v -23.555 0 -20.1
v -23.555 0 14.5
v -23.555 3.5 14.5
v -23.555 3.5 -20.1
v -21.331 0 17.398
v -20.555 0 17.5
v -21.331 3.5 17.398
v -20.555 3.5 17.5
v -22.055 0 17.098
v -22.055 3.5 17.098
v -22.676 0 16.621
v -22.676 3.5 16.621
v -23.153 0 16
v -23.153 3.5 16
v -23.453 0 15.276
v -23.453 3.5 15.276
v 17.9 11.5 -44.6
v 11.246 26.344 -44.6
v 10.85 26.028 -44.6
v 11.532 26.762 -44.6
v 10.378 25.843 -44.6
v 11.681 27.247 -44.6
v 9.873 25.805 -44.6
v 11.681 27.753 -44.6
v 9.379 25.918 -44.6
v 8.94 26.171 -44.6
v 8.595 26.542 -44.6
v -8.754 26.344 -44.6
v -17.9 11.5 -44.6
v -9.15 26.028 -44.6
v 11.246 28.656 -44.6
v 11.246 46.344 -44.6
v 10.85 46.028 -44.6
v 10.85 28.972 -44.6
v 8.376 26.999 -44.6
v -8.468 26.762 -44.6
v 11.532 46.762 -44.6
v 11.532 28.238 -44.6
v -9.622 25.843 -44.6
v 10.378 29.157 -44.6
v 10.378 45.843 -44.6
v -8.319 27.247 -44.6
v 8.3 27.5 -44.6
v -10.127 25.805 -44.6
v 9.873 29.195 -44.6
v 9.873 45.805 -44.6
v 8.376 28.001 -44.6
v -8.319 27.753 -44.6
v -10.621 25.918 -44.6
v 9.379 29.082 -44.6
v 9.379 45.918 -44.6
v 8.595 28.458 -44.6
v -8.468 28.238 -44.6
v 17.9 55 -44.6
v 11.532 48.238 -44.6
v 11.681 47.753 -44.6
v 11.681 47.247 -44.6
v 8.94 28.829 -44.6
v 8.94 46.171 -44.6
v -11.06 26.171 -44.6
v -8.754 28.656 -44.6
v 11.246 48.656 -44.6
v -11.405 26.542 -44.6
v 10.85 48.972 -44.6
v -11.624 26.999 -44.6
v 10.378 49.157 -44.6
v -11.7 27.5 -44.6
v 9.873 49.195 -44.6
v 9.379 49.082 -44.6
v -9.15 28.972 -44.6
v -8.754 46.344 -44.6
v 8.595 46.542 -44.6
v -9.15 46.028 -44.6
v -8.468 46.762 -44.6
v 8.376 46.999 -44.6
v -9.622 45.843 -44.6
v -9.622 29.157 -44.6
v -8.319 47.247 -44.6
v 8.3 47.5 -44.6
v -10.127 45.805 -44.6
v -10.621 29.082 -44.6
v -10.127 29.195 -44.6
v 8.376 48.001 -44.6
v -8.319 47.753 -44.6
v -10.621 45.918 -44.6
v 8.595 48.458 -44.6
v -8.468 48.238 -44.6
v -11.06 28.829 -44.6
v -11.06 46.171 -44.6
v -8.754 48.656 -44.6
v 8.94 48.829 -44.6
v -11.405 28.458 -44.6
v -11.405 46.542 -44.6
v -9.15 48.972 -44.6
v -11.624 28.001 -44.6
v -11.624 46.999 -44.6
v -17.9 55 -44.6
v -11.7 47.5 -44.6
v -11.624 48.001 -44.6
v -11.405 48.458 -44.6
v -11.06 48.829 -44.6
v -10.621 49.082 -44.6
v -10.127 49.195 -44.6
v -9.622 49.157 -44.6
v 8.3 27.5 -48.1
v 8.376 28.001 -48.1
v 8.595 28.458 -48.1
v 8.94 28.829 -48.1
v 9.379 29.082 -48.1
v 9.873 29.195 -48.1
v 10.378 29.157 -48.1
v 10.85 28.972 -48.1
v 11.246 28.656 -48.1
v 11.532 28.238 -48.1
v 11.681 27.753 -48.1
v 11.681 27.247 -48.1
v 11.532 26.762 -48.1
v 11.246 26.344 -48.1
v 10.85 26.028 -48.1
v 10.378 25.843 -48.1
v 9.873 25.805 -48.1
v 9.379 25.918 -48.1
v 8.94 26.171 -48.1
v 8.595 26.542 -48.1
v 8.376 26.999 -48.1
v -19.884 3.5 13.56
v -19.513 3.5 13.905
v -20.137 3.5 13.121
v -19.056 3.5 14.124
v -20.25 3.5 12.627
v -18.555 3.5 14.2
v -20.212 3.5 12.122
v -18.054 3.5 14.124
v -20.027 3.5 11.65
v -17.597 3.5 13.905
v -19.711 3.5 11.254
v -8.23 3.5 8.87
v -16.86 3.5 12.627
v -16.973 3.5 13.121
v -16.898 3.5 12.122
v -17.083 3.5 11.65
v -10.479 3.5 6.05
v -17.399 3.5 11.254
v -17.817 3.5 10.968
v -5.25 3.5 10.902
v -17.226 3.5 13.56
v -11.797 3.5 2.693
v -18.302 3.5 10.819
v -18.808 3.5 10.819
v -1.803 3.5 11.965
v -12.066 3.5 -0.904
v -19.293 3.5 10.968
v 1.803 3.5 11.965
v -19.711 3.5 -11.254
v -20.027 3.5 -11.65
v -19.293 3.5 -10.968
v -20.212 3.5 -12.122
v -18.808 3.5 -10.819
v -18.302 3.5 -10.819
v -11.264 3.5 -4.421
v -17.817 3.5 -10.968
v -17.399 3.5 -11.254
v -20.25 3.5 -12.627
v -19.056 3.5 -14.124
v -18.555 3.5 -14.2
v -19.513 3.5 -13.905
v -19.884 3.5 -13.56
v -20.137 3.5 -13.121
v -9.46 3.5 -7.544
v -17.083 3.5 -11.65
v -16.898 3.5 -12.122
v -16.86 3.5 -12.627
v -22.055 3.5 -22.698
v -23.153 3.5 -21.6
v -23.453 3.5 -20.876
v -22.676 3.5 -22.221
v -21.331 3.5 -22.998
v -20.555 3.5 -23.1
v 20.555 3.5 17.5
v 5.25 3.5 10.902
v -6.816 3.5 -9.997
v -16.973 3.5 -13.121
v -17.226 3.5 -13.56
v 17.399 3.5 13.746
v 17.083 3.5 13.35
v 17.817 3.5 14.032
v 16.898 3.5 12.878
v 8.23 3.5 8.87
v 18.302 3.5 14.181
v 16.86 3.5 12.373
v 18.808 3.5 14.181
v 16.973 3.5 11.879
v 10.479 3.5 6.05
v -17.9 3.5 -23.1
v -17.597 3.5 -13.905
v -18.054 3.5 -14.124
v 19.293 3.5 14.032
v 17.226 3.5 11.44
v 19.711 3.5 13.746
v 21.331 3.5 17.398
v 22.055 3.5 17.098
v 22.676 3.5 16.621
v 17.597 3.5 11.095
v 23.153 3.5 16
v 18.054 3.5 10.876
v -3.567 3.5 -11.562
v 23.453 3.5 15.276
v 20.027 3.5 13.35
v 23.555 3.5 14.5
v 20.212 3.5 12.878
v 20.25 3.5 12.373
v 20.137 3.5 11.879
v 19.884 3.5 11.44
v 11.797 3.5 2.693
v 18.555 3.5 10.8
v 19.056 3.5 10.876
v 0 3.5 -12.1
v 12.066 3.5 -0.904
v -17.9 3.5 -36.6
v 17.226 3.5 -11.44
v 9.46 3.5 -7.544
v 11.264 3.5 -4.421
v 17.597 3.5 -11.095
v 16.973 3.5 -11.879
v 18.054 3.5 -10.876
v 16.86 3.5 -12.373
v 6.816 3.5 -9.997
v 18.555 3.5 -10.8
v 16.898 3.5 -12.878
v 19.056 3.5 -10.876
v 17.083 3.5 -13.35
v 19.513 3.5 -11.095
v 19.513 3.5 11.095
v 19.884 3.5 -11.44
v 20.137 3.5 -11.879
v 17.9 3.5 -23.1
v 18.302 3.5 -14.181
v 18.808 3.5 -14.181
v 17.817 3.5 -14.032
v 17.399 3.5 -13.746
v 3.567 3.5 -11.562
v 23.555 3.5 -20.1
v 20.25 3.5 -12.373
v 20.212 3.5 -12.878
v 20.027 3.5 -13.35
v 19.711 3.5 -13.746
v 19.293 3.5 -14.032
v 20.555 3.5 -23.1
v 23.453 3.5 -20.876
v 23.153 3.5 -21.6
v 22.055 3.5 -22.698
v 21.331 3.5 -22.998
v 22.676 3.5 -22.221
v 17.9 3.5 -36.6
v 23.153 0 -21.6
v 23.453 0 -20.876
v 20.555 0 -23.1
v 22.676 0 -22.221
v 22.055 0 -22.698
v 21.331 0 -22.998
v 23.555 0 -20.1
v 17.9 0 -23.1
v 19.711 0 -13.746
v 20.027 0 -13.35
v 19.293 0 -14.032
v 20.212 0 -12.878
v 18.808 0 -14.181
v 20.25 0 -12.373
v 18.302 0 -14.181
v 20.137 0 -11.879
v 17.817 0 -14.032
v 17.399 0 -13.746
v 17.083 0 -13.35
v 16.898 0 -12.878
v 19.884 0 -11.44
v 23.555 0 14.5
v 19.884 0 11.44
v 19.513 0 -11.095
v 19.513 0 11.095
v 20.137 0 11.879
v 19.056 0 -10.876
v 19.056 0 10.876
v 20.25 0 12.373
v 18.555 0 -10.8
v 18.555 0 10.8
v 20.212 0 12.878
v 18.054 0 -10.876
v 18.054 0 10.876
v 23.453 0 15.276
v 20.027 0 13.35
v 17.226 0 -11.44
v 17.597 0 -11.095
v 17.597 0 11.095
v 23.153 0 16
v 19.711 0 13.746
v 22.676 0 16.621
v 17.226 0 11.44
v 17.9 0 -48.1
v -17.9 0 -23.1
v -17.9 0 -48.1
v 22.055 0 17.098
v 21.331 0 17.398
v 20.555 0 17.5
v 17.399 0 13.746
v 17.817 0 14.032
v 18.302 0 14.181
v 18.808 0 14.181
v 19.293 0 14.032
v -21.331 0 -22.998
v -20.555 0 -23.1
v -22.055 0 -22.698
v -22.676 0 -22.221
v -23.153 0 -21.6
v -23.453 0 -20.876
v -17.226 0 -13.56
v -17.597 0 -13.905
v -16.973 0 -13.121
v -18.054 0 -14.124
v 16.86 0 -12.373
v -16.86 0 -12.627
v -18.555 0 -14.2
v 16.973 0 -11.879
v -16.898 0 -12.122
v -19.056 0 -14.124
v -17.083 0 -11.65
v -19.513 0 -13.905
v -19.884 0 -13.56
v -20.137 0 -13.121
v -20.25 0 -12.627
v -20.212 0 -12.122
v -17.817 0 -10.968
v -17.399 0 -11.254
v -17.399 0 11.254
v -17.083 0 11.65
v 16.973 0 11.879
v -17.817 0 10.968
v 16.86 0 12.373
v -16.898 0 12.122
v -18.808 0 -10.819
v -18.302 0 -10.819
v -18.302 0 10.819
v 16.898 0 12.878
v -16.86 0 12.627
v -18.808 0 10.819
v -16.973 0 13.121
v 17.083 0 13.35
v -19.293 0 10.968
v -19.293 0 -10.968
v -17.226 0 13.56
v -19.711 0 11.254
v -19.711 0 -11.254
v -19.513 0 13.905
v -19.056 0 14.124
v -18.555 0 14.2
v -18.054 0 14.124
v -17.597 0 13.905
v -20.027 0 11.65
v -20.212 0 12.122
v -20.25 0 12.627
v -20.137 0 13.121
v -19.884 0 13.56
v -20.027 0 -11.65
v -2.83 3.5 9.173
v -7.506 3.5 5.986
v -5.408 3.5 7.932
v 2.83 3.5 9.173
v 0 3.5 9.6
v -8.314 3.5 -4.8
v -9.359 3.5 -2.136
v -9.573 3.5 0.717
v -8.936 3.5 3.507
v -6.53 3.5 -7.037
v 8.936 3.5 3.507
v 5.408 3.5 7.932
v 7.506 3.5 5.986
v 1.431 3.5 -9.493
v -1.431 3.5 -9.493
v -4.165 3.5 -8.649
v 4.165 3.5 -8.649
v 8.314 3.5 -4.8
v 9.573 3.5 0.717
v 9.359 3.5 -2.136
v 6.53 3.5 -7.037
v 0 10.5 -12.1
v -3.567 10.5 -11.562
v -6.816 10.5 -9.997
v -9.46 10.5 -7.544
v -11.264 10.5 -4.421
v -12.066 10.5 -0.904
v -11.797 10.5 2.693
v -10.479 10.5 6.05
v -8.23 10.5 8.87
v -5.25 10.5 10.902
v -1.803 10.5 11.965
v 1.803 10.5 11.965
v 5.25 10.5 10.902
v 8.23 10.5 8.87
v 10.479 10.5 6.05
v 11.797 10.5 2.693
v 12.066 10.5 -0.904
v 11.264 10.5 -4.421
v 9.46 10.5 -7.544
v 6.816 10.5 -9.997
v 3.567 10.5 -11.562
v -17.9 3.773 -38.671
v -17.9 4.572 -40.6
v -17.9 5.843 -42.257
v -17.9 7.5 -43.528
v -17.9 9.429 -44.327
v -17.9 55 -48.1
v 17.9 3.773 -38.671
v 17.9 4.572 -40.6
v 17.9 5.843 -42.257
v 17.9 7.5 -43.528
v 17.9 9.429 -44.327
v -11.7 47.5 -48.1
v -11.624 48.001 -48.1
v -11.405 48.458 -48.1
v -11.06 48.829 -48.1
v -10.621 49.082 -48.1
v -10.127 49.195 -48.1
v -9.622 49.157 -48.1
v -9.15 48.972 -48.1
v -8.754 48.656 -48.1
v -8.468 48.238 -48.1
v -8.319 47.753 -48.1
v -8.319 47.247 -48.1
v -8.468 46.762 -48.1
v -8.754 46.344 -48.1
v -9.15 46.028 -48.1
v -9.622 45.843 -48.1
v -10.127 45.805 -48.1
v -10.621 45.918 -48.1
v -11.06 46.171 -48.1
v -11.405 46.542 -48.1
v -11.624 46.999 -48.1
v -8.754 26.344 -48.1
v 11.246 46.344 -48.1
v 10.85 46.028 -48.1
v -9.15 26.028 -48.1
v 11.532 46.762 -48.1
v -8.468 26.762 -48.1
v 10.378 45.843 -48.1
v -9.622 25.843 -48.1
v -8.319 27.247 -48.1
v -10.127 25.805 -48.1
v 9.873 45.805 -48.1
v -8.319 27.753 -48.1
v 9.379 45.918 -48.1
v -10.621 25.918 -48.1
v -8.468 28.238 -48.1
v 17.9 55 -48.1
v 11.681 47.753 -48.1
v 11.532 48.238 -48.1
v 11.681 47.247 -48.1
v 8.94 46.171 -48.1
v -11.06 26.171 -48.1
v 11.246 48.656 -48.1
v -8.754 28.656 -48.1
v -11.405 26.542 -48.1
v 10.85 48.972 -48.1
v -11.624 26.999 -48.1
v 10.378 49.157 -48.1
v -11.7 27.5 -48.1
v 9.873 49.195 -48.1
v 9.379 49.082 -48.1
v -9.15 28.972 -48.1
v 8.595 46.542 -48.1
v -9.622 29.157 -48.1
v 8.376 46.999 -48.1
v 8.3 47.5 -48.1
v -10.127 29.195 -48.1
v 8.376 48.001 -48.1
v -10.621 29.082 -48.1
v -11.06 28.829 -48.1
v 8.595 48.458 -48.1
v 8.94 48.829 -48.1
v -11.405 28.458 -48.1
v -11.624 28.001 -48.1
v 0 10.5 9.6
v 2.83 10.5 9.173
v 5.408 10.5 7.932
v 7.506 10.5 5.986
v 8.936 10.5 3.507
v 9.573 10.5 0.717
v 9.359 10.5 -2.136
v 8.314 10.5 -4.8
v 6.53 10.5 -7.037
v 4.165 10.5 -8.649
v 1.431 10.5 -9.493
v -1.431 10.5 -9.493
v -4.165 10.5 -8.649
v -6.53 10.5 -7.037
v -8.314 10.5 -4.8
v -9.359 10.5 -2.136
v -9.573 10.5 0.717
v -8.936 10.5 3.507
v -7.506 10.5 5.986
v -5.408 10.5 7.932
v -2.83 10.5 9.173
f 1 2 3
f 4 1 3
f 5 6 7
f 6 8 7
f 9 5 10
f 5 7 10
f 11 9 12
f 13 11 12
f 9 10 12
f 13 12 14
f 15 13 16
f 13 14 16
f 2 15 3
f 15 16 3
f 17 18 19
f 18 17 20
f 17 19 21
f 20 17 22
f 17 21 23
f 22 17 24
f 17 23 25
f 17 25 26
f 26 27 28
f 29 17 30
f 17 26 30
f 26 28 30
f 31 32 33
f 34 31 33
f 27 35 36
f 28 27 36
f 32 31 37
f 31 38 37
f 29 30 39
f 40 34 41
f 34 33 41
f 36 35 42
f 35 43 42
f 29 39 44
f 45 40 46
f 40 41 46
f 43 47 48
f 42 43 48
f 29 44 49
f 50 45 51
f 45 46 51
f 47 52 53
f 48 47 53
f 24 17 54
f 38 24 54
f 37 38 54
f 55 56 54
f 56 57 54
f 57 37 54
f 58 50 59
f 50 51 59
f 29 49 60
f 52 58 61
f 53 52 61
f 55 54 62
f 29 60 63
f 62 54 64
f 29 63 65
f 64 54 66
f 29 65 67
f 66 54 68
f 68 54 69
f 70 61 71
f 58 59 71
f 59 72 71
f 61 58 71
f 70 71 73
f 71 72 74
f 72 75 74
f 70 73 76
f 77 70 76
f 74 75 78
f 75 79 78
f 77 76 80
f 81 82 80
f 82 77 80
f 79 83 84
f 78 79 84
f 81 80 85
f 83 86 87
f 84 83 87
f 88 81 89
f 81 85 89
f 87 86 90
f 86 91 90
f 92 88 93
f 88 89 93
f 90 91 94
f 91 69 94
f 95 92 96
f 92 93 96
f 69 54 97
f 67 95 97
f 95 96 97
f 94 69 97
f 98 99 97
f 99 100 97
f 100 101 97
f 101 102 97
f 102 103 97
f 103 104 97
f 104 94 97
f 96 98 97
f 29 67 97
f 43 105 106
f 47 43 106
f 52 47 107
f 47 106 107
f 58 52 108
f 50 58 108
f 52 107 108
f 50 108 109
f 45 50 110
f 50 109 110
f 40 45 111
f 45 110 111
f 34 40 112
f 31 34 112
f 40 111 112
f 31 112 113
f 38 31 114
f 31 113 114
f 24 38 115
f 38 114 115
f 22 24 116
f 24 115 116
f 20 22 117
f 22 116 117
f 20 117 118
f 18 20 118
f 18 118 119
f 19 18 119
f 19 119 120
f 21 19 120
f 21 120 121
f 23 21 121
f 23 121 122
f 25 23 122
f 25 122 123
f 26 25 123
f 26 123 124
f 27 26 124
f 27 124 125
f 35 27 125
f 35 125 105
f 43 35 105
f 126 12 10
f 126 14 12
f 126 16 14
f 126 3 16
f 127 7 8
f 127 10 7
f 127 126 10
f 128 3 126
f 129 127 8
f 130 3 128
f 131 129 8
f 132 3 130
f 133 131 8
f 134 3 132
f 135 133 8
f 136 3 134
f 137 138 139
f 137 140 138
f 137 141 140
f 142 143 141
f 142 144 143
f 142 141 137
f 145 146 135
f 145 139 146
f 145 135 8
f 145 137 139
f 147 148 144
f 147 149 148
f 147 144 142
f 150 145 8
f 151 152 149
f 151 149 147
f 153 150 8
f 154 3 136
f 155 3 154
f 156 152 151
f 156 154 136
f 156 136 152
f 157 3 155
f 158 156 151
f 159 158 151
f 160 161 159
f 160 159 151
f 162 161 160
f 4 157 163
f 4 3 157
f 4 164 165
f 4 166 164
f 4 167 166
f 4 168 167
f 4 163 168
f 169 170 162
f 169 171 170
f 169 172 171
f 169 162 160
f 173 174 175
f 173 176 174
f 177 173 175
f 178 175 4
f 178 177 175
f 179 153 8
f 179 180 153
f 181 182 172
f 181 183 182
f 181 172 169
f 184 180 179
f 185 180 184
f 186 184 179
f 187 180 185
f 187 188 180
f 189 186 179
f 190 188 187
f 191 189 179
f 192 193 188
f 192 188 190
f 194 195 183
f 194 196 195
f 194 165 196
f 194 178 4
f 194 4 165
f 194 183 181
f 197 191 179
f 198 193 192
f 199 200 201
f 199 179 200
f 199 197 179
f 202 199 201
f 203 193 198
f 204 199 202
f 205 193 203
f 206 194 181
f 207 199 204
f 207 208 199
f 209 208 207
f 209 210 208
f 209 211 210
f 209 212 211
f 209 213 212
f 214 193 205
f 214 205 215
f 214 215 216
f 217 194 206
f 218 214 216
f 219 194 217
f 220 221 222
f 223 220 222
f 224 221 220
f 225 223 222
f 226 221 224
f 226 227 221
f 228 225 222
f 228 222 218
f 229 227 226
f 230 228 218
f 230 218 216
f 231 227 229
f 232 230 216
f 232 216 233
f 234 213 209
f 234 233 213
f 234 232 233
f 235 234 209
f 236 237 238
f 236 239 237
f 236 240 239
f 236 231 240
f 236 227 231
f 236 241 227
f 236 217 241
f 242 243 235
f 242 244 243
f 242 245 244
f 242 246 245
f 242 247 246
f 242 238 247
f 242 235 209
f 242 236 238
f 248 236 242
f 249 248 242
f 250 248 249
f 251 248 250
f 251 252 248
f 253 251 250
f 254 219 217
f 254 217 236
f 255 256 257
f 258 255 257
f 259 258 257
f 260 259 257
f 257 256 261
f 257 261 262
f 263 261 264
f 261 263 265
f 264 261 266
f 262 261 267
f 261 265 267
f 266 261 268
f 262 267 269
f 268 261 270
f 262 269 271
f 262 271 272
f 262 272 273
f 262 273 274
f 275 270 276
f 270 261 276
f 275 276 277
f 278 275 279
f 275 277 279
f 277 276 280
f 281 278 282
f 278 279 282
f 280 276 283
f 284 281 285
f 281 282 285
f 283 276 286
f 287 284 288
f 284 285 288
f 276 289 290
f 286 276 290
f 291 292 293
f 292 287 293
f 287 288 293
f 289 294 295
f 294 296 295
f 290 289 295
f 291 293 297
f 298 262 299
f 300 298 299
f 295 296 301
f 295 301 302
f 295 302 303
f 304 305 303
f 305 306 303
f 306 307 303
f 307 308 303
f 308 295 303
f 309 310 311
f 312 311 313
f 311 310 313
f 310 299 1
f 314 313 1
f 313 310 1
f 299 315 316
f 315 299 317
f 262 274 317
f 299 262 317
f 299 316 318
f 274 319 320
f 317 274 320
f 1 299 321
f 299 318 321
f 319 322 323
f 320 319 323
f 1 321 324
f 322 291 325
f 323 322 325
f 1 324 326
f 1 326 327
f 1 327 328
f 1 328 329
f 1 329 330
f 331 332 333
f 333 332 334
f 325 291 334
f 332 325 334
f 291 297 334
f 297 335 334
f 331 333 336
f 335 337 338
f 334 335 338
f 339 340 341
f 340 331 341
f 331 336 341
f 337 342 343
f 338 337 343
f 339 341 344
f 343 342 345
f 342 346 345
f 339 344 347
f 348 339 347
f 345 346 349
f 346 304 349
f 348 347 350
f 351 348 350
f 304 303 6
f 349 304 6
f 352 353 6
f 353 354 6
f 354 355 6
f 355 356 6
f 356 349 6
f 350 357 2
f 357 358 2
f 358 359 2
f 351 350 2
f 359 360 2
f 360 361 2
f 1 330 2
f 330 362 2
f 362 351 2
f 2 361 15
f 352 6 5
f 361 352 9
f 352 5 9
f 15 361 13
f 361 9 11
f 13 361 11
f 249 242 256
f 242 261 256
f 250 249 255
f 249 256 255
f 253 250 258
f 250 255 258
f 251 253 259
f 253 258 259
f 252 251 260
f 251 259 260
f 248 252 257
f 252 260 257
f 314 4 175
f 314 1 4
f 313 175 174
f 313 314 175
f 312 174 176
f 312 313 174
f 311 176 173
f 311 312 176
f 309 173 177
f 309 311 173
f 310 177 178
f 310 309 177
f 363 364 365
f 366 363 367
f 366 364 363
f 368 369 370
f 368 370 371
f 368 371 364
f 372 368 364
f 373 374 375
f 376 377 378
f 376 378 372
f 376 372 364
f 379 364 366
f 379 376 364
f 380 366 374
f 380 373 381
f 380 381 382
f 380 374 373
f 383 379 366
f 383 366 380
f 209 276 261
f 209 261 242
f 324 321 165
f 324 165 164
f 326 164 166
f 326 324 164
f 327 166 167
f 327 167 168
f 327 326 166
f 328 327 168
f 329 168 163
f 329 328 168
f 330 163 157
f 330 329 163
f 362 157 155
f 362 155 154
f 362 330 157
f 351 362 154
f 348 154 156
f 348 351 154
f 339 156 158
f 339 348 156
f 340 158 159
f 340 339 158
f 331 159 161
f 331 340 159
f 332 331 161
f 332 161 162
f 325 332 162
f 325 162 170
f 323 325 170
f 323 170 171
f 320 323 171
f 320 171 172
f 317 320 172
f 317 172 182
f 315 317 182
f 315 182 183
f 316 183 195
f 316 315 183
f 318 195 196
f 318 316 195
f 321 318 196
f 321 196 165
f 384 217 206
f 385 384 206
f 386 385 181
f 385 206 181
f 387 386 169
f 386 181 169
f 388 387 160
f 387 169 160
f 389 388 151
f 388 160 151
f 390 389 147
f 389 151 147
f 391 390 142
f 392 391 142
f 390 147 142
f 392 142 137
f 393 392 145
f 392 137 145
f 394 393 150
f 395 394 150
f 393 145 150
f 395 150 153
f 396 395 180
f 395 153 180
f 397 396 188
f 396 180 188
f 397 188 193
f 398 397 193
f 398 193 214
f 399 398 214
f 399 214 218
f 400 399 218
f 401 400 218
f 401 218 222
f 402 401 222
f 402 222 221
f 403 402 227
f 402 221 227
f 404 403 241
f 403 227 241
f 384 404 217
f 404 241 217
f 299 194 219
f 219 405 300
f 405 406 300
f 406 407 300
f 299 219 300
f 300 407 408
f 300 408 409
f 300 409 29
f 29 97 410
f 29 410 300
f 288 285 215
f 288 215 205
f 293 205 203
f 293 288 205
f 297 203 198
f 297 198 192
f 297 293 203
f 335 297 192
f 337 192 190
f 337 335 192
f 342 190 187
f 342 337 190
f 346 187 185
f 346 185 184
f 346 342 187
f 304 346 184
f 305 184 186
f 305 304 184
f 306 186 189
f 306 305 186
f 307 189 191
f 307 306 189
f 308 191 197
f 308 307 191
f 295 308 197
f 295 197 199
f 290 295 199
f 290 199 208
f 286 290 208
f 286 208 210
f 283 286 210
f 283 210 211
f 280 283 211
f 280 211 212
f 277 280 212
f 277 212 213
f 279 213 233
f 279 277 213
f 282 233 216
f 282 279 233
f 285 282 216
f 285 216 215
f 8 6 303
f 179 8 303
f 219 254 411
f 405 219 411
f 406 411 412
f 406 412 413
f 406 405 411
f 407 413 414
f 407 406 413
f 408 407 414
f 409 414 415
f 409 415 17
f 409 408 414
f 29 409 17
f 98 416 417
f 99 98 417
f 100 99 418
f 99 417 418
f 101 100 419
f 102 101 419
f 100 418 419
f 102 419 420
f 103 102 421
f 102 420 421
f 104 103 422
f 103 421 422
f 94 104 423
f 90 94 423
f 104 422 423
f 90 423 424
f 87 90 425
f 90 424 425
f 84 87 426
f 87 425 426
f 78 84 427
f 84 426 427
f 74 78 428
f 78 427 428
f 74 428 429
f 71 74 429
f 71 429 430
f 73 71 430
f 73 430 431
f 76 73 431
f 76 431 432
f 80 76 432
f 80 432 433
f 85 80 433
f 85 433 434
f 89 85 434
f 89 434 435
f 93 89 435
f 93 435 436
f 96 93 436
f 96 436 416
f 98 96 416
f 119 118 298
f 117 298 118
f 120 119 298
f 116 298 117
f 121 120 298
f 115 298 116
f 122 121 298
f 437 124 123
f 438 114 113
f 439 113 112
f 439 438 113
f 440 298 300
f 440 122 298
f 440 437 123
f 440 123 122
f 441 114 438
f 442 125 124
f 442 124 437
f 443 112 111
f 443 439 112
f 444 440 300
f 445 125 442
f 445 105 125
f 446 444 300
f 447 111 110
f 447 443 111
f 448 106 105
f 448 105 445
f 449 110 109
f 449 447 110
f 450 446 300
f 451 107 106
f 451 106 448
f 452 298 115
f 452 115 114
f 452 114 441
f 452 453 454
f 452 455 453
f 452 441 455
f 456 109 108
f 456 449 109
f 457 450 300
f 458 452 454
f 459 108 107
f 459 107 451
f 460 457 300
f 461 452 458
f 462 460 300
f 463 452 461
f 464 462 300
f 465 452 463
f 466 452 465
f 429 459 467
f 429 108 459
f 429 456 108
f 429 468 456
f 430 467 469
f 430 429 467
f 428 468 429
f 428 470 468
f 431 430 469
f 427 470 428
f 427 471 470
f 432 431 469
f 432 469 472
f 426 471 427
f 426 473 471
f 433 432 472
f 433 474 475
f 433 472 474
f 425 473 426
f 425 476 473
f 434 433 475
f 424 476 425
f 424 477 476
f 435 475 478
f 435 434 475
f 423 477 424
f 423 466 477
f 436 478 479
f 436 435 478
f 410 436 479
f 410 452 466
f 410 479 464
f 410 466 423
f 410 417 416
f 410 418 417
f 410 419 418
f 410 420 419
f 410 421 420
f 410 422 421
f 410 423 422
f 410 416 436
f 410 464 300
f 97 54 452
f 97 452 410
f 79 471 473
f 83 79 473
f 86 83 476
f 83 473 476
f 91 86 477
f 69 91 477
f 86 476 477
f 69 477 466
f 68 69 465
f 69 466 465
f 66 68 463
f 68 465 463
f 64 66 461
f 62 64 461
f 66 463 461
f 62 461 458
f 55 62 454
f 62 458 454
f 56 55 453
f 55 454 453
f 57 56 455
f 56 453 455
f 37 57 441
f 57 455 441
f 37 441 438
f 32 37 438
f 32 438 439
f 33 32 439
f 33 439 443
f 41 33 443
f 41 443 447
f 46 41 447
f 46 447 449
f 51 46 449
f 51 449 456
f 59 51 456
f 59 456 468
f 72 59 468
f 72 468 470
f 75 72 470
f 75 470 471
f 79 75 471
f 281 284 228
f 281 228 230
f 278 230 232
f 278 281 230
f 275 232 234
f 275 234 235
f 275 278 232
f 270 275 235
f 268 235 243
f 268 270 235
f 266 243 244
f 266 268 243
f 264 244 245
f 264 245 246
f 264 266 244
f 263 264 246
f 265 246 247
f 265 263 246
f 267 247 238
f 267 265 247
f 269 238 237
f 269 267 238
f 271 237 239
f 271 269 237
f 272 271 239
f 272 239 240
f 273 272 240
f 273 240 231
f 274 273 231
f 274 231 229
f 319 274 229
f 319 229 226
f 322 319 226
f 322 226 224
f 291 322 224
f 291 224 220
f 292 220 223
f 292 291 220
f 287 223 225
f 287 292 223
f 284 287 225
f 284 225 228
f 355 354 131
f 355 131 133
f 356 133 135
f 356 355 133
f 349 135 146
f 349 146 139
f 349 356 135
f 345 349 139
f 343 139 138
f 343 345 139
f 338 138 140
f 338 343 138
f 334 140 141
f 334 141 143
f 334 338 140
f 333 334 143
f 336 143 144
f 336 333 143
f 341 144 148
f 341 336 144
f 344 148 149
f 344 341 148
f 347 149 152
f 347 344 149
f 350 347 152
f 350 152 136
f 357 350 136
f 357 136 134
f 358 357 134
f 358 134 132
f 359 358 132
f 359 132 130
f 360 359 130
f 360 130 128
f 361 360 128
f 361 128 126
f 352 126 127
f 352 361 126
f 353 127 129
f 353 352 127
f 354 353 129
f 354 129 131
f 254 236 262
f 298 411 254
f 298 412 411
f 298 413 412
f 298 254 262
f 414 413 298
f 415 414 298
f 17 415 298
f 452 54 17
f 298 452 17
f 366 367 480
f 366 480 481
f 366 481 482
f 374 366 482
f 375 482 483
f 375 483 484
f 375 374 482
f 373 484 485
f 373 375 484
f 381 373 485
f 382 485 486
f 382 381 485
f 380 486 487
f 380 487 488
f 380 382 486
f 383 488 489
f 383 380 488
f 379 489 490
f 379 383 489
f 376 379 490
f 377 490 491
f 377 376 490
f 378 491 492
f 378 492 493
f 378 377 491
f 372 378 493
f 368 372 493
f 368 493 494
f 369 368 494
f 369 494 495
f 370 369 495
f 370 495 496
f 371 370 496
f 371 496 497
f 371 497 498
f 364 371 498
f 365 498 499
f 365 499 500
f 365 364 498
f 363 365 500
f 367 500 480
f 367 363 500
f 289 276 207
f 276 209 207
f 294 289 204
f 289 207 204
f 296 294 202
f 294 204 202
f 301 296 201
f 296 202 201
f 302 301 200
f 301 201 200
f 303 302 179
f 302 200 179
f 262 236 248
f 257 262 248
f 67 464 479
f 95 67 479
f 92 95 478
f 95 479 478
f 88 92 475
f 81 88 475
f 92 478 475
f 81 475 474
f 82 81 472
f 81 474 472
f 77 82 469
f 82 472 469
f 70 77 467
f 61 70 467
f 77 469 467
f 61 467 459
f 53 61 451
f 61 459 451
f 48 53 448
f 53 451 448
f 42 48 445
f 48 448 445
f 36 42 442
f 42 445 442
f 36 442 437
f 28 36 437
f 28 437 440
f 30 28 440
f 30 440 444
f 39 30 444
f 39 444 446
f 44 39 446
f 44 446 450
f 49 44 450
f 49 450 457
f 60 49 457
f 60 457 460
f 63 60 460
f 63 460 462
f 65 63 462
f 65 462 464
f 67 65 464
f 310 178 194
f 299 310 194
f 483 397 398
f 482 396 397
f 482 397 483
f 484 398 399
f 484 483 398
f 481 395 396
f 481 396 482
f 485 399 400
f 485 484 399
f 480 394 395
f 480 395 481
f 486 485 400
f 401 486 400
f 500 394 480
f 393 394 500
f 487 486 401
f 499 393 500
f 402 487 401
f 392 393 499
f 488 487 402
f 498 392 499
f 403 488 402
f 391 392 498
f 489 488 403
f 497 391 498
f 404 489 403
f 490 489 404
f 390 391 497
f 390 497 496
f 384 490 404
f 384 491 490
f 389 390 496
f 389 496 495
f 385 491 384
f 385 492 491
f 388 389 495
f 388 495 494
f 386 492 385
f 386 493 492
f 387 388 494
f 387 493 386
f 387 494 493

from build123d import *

# Parameters (mm, degrees)
SKETCH1_R           = 1.7
BOSS_EXTRUDE1_DEPTH = 3.5
SKETCH2_R           = 12.1
SKETCH2_R_2         = 9.6
BOSS_EXTRUDE2_DEPTH = 7
SKETCH3_W           = 47.11
SKETCH3_H           = 55
BOSS_EXTRUDE3_DEPTH = 3.5
SKETCH4_R           = 1.7
CUT_EXTRUDE1_DEPTH  = 89.787375369
SKETCH5_W           = 5.655
SKETCH5_H           = 25
CUT_EXTRUDE2_DEPTH  = 77.768795907
FILLET3_R           = 3
FILLET4_R           = 8


with BuildPart() as part:
    # Sketch1 → Boss-Extrude1 (new body)
    with BuildSketch(Plane(origin=(0, 0, 0), x_dir=(1, 0, 0), z_dir=(0, 1, 0))):
        Polygon((-23.555, 17.5), (-23.555, -17.5), (23.555, -17.5), (23.555, 17.5), (23.555, 44.6), (-23.555, 44.6), align=None)
        with Locations(Location((-18.555, -12.5, 0), (0, 0, 270))):
            Circle(SKETCH1_R, mode=Mode.SUBTRACT)
        with Locations(Location((-18.555, 12.5, 0), (0, 0, 90))):
            Circle(SKETCH1_R, mode=Mode.SUBTRACT)
        with Locations(Location((18.555, -12.5, 0), (0, 0, 90))):
            Circle(SKETCH1_R, mode=Mode.SUBTRACT)
        with Locations(Location((18.555, 12.5, 0), (0, 0, 270))):
            Circle(SKETCH1_R, mode=Mode.SUBTRACT)
    extrude(amount=BOSS_EXTRUDE1_DEPTH)

    # Sketch2 → Boss-Extrude2 (add)
    with BuildSketch(Plane(origin=(0, 3.5, 0), x_dir=(1, 0, 0), z_dir=(0, 1, 0))):
        with Locations(Location((0, 0, 0), (0, 0, 90))):
            Circle(SKETCH2_R)
        with Locations(Location((0, 0, 0), (0, 0, 270))):
            Circle(SKETCH2_R_2, mode=Mode.SUBTRACT)
    extrude(amount=BOSS_EXTRUDE2_DEPTH)

    # Sketch3 → Boss-Extrude3 (add)
    with BuildSketch(Plane(origin=(0, 0, -44.6), x_dir=(-1, 0, 0), z_dir=(0, 0, -1))):
        with Locations((0, 27.5)):
            Rectangle(SKETCH3_W, SKETCH3_H)
    extrude(amount=BOSS_EXTRUDE3_DEPTH)

    # Sketch4 → Cut-Extrude1 (cut, through all)
    with BuildSketch(Plane(origin=(0, 0, -48.1), x_dir=(-1, 0, 0), z_dir=(0, 0, -1))):
        with Locations((-10, 47.5)):
            Circle(SKETCH4_R)
        with Locations((-10, 27.5)):
            Circle(SKETCH4_R)
        with Locations((10, 27.5)):
            Circle(SKETCH4_R)
        with Locations((10, 47.5)):
            Circle(SKETCH4_R)
    extrude(amount=-CUT_EXTRUDE1_DEPTH, mode=Mode.SUBTRACT)

    # Sketch5 → Cut-Extrude2 (cut, through all)
    with BuildSketch(Plane(origin=(0, 55, 0), x_dir=(1, 0, 0), z_dir=(0, 1, 0))):
        with Locations((-20.7275, 35.6)):
            Rectangle(SKETCH5_W, SKETCH5_H)
        with Locations((20.7275, 35.6)):
            Rectangle(SKETCH5_W, SKETCH5_H)
    extrude(amount=-CUT_EXTRUDE2_DEPTH, mode=Mode.SUBTRACT)

    # Fillet3
    fillet3_edges = [part.edges().sort_by_distance(p)[0] for p in [
        (23.555, 1.75, -23.1),
        (23.555, 1.75, 17.5),
        (-23.555, 1.75, 17.5),
        (-23.555, 1.75, -23.1),
    ]]
    fillet(fillet3_edges, radius=FILLET3_R)

    # Fillet4
    fillet4_edges = [part.edges().sort_by_distance(p)[0] for p in [
        (0, 3.5, -44.6),
    ]]
    fillet(fillet4_edges, radius=FILLET4_R)


solid = part.part
